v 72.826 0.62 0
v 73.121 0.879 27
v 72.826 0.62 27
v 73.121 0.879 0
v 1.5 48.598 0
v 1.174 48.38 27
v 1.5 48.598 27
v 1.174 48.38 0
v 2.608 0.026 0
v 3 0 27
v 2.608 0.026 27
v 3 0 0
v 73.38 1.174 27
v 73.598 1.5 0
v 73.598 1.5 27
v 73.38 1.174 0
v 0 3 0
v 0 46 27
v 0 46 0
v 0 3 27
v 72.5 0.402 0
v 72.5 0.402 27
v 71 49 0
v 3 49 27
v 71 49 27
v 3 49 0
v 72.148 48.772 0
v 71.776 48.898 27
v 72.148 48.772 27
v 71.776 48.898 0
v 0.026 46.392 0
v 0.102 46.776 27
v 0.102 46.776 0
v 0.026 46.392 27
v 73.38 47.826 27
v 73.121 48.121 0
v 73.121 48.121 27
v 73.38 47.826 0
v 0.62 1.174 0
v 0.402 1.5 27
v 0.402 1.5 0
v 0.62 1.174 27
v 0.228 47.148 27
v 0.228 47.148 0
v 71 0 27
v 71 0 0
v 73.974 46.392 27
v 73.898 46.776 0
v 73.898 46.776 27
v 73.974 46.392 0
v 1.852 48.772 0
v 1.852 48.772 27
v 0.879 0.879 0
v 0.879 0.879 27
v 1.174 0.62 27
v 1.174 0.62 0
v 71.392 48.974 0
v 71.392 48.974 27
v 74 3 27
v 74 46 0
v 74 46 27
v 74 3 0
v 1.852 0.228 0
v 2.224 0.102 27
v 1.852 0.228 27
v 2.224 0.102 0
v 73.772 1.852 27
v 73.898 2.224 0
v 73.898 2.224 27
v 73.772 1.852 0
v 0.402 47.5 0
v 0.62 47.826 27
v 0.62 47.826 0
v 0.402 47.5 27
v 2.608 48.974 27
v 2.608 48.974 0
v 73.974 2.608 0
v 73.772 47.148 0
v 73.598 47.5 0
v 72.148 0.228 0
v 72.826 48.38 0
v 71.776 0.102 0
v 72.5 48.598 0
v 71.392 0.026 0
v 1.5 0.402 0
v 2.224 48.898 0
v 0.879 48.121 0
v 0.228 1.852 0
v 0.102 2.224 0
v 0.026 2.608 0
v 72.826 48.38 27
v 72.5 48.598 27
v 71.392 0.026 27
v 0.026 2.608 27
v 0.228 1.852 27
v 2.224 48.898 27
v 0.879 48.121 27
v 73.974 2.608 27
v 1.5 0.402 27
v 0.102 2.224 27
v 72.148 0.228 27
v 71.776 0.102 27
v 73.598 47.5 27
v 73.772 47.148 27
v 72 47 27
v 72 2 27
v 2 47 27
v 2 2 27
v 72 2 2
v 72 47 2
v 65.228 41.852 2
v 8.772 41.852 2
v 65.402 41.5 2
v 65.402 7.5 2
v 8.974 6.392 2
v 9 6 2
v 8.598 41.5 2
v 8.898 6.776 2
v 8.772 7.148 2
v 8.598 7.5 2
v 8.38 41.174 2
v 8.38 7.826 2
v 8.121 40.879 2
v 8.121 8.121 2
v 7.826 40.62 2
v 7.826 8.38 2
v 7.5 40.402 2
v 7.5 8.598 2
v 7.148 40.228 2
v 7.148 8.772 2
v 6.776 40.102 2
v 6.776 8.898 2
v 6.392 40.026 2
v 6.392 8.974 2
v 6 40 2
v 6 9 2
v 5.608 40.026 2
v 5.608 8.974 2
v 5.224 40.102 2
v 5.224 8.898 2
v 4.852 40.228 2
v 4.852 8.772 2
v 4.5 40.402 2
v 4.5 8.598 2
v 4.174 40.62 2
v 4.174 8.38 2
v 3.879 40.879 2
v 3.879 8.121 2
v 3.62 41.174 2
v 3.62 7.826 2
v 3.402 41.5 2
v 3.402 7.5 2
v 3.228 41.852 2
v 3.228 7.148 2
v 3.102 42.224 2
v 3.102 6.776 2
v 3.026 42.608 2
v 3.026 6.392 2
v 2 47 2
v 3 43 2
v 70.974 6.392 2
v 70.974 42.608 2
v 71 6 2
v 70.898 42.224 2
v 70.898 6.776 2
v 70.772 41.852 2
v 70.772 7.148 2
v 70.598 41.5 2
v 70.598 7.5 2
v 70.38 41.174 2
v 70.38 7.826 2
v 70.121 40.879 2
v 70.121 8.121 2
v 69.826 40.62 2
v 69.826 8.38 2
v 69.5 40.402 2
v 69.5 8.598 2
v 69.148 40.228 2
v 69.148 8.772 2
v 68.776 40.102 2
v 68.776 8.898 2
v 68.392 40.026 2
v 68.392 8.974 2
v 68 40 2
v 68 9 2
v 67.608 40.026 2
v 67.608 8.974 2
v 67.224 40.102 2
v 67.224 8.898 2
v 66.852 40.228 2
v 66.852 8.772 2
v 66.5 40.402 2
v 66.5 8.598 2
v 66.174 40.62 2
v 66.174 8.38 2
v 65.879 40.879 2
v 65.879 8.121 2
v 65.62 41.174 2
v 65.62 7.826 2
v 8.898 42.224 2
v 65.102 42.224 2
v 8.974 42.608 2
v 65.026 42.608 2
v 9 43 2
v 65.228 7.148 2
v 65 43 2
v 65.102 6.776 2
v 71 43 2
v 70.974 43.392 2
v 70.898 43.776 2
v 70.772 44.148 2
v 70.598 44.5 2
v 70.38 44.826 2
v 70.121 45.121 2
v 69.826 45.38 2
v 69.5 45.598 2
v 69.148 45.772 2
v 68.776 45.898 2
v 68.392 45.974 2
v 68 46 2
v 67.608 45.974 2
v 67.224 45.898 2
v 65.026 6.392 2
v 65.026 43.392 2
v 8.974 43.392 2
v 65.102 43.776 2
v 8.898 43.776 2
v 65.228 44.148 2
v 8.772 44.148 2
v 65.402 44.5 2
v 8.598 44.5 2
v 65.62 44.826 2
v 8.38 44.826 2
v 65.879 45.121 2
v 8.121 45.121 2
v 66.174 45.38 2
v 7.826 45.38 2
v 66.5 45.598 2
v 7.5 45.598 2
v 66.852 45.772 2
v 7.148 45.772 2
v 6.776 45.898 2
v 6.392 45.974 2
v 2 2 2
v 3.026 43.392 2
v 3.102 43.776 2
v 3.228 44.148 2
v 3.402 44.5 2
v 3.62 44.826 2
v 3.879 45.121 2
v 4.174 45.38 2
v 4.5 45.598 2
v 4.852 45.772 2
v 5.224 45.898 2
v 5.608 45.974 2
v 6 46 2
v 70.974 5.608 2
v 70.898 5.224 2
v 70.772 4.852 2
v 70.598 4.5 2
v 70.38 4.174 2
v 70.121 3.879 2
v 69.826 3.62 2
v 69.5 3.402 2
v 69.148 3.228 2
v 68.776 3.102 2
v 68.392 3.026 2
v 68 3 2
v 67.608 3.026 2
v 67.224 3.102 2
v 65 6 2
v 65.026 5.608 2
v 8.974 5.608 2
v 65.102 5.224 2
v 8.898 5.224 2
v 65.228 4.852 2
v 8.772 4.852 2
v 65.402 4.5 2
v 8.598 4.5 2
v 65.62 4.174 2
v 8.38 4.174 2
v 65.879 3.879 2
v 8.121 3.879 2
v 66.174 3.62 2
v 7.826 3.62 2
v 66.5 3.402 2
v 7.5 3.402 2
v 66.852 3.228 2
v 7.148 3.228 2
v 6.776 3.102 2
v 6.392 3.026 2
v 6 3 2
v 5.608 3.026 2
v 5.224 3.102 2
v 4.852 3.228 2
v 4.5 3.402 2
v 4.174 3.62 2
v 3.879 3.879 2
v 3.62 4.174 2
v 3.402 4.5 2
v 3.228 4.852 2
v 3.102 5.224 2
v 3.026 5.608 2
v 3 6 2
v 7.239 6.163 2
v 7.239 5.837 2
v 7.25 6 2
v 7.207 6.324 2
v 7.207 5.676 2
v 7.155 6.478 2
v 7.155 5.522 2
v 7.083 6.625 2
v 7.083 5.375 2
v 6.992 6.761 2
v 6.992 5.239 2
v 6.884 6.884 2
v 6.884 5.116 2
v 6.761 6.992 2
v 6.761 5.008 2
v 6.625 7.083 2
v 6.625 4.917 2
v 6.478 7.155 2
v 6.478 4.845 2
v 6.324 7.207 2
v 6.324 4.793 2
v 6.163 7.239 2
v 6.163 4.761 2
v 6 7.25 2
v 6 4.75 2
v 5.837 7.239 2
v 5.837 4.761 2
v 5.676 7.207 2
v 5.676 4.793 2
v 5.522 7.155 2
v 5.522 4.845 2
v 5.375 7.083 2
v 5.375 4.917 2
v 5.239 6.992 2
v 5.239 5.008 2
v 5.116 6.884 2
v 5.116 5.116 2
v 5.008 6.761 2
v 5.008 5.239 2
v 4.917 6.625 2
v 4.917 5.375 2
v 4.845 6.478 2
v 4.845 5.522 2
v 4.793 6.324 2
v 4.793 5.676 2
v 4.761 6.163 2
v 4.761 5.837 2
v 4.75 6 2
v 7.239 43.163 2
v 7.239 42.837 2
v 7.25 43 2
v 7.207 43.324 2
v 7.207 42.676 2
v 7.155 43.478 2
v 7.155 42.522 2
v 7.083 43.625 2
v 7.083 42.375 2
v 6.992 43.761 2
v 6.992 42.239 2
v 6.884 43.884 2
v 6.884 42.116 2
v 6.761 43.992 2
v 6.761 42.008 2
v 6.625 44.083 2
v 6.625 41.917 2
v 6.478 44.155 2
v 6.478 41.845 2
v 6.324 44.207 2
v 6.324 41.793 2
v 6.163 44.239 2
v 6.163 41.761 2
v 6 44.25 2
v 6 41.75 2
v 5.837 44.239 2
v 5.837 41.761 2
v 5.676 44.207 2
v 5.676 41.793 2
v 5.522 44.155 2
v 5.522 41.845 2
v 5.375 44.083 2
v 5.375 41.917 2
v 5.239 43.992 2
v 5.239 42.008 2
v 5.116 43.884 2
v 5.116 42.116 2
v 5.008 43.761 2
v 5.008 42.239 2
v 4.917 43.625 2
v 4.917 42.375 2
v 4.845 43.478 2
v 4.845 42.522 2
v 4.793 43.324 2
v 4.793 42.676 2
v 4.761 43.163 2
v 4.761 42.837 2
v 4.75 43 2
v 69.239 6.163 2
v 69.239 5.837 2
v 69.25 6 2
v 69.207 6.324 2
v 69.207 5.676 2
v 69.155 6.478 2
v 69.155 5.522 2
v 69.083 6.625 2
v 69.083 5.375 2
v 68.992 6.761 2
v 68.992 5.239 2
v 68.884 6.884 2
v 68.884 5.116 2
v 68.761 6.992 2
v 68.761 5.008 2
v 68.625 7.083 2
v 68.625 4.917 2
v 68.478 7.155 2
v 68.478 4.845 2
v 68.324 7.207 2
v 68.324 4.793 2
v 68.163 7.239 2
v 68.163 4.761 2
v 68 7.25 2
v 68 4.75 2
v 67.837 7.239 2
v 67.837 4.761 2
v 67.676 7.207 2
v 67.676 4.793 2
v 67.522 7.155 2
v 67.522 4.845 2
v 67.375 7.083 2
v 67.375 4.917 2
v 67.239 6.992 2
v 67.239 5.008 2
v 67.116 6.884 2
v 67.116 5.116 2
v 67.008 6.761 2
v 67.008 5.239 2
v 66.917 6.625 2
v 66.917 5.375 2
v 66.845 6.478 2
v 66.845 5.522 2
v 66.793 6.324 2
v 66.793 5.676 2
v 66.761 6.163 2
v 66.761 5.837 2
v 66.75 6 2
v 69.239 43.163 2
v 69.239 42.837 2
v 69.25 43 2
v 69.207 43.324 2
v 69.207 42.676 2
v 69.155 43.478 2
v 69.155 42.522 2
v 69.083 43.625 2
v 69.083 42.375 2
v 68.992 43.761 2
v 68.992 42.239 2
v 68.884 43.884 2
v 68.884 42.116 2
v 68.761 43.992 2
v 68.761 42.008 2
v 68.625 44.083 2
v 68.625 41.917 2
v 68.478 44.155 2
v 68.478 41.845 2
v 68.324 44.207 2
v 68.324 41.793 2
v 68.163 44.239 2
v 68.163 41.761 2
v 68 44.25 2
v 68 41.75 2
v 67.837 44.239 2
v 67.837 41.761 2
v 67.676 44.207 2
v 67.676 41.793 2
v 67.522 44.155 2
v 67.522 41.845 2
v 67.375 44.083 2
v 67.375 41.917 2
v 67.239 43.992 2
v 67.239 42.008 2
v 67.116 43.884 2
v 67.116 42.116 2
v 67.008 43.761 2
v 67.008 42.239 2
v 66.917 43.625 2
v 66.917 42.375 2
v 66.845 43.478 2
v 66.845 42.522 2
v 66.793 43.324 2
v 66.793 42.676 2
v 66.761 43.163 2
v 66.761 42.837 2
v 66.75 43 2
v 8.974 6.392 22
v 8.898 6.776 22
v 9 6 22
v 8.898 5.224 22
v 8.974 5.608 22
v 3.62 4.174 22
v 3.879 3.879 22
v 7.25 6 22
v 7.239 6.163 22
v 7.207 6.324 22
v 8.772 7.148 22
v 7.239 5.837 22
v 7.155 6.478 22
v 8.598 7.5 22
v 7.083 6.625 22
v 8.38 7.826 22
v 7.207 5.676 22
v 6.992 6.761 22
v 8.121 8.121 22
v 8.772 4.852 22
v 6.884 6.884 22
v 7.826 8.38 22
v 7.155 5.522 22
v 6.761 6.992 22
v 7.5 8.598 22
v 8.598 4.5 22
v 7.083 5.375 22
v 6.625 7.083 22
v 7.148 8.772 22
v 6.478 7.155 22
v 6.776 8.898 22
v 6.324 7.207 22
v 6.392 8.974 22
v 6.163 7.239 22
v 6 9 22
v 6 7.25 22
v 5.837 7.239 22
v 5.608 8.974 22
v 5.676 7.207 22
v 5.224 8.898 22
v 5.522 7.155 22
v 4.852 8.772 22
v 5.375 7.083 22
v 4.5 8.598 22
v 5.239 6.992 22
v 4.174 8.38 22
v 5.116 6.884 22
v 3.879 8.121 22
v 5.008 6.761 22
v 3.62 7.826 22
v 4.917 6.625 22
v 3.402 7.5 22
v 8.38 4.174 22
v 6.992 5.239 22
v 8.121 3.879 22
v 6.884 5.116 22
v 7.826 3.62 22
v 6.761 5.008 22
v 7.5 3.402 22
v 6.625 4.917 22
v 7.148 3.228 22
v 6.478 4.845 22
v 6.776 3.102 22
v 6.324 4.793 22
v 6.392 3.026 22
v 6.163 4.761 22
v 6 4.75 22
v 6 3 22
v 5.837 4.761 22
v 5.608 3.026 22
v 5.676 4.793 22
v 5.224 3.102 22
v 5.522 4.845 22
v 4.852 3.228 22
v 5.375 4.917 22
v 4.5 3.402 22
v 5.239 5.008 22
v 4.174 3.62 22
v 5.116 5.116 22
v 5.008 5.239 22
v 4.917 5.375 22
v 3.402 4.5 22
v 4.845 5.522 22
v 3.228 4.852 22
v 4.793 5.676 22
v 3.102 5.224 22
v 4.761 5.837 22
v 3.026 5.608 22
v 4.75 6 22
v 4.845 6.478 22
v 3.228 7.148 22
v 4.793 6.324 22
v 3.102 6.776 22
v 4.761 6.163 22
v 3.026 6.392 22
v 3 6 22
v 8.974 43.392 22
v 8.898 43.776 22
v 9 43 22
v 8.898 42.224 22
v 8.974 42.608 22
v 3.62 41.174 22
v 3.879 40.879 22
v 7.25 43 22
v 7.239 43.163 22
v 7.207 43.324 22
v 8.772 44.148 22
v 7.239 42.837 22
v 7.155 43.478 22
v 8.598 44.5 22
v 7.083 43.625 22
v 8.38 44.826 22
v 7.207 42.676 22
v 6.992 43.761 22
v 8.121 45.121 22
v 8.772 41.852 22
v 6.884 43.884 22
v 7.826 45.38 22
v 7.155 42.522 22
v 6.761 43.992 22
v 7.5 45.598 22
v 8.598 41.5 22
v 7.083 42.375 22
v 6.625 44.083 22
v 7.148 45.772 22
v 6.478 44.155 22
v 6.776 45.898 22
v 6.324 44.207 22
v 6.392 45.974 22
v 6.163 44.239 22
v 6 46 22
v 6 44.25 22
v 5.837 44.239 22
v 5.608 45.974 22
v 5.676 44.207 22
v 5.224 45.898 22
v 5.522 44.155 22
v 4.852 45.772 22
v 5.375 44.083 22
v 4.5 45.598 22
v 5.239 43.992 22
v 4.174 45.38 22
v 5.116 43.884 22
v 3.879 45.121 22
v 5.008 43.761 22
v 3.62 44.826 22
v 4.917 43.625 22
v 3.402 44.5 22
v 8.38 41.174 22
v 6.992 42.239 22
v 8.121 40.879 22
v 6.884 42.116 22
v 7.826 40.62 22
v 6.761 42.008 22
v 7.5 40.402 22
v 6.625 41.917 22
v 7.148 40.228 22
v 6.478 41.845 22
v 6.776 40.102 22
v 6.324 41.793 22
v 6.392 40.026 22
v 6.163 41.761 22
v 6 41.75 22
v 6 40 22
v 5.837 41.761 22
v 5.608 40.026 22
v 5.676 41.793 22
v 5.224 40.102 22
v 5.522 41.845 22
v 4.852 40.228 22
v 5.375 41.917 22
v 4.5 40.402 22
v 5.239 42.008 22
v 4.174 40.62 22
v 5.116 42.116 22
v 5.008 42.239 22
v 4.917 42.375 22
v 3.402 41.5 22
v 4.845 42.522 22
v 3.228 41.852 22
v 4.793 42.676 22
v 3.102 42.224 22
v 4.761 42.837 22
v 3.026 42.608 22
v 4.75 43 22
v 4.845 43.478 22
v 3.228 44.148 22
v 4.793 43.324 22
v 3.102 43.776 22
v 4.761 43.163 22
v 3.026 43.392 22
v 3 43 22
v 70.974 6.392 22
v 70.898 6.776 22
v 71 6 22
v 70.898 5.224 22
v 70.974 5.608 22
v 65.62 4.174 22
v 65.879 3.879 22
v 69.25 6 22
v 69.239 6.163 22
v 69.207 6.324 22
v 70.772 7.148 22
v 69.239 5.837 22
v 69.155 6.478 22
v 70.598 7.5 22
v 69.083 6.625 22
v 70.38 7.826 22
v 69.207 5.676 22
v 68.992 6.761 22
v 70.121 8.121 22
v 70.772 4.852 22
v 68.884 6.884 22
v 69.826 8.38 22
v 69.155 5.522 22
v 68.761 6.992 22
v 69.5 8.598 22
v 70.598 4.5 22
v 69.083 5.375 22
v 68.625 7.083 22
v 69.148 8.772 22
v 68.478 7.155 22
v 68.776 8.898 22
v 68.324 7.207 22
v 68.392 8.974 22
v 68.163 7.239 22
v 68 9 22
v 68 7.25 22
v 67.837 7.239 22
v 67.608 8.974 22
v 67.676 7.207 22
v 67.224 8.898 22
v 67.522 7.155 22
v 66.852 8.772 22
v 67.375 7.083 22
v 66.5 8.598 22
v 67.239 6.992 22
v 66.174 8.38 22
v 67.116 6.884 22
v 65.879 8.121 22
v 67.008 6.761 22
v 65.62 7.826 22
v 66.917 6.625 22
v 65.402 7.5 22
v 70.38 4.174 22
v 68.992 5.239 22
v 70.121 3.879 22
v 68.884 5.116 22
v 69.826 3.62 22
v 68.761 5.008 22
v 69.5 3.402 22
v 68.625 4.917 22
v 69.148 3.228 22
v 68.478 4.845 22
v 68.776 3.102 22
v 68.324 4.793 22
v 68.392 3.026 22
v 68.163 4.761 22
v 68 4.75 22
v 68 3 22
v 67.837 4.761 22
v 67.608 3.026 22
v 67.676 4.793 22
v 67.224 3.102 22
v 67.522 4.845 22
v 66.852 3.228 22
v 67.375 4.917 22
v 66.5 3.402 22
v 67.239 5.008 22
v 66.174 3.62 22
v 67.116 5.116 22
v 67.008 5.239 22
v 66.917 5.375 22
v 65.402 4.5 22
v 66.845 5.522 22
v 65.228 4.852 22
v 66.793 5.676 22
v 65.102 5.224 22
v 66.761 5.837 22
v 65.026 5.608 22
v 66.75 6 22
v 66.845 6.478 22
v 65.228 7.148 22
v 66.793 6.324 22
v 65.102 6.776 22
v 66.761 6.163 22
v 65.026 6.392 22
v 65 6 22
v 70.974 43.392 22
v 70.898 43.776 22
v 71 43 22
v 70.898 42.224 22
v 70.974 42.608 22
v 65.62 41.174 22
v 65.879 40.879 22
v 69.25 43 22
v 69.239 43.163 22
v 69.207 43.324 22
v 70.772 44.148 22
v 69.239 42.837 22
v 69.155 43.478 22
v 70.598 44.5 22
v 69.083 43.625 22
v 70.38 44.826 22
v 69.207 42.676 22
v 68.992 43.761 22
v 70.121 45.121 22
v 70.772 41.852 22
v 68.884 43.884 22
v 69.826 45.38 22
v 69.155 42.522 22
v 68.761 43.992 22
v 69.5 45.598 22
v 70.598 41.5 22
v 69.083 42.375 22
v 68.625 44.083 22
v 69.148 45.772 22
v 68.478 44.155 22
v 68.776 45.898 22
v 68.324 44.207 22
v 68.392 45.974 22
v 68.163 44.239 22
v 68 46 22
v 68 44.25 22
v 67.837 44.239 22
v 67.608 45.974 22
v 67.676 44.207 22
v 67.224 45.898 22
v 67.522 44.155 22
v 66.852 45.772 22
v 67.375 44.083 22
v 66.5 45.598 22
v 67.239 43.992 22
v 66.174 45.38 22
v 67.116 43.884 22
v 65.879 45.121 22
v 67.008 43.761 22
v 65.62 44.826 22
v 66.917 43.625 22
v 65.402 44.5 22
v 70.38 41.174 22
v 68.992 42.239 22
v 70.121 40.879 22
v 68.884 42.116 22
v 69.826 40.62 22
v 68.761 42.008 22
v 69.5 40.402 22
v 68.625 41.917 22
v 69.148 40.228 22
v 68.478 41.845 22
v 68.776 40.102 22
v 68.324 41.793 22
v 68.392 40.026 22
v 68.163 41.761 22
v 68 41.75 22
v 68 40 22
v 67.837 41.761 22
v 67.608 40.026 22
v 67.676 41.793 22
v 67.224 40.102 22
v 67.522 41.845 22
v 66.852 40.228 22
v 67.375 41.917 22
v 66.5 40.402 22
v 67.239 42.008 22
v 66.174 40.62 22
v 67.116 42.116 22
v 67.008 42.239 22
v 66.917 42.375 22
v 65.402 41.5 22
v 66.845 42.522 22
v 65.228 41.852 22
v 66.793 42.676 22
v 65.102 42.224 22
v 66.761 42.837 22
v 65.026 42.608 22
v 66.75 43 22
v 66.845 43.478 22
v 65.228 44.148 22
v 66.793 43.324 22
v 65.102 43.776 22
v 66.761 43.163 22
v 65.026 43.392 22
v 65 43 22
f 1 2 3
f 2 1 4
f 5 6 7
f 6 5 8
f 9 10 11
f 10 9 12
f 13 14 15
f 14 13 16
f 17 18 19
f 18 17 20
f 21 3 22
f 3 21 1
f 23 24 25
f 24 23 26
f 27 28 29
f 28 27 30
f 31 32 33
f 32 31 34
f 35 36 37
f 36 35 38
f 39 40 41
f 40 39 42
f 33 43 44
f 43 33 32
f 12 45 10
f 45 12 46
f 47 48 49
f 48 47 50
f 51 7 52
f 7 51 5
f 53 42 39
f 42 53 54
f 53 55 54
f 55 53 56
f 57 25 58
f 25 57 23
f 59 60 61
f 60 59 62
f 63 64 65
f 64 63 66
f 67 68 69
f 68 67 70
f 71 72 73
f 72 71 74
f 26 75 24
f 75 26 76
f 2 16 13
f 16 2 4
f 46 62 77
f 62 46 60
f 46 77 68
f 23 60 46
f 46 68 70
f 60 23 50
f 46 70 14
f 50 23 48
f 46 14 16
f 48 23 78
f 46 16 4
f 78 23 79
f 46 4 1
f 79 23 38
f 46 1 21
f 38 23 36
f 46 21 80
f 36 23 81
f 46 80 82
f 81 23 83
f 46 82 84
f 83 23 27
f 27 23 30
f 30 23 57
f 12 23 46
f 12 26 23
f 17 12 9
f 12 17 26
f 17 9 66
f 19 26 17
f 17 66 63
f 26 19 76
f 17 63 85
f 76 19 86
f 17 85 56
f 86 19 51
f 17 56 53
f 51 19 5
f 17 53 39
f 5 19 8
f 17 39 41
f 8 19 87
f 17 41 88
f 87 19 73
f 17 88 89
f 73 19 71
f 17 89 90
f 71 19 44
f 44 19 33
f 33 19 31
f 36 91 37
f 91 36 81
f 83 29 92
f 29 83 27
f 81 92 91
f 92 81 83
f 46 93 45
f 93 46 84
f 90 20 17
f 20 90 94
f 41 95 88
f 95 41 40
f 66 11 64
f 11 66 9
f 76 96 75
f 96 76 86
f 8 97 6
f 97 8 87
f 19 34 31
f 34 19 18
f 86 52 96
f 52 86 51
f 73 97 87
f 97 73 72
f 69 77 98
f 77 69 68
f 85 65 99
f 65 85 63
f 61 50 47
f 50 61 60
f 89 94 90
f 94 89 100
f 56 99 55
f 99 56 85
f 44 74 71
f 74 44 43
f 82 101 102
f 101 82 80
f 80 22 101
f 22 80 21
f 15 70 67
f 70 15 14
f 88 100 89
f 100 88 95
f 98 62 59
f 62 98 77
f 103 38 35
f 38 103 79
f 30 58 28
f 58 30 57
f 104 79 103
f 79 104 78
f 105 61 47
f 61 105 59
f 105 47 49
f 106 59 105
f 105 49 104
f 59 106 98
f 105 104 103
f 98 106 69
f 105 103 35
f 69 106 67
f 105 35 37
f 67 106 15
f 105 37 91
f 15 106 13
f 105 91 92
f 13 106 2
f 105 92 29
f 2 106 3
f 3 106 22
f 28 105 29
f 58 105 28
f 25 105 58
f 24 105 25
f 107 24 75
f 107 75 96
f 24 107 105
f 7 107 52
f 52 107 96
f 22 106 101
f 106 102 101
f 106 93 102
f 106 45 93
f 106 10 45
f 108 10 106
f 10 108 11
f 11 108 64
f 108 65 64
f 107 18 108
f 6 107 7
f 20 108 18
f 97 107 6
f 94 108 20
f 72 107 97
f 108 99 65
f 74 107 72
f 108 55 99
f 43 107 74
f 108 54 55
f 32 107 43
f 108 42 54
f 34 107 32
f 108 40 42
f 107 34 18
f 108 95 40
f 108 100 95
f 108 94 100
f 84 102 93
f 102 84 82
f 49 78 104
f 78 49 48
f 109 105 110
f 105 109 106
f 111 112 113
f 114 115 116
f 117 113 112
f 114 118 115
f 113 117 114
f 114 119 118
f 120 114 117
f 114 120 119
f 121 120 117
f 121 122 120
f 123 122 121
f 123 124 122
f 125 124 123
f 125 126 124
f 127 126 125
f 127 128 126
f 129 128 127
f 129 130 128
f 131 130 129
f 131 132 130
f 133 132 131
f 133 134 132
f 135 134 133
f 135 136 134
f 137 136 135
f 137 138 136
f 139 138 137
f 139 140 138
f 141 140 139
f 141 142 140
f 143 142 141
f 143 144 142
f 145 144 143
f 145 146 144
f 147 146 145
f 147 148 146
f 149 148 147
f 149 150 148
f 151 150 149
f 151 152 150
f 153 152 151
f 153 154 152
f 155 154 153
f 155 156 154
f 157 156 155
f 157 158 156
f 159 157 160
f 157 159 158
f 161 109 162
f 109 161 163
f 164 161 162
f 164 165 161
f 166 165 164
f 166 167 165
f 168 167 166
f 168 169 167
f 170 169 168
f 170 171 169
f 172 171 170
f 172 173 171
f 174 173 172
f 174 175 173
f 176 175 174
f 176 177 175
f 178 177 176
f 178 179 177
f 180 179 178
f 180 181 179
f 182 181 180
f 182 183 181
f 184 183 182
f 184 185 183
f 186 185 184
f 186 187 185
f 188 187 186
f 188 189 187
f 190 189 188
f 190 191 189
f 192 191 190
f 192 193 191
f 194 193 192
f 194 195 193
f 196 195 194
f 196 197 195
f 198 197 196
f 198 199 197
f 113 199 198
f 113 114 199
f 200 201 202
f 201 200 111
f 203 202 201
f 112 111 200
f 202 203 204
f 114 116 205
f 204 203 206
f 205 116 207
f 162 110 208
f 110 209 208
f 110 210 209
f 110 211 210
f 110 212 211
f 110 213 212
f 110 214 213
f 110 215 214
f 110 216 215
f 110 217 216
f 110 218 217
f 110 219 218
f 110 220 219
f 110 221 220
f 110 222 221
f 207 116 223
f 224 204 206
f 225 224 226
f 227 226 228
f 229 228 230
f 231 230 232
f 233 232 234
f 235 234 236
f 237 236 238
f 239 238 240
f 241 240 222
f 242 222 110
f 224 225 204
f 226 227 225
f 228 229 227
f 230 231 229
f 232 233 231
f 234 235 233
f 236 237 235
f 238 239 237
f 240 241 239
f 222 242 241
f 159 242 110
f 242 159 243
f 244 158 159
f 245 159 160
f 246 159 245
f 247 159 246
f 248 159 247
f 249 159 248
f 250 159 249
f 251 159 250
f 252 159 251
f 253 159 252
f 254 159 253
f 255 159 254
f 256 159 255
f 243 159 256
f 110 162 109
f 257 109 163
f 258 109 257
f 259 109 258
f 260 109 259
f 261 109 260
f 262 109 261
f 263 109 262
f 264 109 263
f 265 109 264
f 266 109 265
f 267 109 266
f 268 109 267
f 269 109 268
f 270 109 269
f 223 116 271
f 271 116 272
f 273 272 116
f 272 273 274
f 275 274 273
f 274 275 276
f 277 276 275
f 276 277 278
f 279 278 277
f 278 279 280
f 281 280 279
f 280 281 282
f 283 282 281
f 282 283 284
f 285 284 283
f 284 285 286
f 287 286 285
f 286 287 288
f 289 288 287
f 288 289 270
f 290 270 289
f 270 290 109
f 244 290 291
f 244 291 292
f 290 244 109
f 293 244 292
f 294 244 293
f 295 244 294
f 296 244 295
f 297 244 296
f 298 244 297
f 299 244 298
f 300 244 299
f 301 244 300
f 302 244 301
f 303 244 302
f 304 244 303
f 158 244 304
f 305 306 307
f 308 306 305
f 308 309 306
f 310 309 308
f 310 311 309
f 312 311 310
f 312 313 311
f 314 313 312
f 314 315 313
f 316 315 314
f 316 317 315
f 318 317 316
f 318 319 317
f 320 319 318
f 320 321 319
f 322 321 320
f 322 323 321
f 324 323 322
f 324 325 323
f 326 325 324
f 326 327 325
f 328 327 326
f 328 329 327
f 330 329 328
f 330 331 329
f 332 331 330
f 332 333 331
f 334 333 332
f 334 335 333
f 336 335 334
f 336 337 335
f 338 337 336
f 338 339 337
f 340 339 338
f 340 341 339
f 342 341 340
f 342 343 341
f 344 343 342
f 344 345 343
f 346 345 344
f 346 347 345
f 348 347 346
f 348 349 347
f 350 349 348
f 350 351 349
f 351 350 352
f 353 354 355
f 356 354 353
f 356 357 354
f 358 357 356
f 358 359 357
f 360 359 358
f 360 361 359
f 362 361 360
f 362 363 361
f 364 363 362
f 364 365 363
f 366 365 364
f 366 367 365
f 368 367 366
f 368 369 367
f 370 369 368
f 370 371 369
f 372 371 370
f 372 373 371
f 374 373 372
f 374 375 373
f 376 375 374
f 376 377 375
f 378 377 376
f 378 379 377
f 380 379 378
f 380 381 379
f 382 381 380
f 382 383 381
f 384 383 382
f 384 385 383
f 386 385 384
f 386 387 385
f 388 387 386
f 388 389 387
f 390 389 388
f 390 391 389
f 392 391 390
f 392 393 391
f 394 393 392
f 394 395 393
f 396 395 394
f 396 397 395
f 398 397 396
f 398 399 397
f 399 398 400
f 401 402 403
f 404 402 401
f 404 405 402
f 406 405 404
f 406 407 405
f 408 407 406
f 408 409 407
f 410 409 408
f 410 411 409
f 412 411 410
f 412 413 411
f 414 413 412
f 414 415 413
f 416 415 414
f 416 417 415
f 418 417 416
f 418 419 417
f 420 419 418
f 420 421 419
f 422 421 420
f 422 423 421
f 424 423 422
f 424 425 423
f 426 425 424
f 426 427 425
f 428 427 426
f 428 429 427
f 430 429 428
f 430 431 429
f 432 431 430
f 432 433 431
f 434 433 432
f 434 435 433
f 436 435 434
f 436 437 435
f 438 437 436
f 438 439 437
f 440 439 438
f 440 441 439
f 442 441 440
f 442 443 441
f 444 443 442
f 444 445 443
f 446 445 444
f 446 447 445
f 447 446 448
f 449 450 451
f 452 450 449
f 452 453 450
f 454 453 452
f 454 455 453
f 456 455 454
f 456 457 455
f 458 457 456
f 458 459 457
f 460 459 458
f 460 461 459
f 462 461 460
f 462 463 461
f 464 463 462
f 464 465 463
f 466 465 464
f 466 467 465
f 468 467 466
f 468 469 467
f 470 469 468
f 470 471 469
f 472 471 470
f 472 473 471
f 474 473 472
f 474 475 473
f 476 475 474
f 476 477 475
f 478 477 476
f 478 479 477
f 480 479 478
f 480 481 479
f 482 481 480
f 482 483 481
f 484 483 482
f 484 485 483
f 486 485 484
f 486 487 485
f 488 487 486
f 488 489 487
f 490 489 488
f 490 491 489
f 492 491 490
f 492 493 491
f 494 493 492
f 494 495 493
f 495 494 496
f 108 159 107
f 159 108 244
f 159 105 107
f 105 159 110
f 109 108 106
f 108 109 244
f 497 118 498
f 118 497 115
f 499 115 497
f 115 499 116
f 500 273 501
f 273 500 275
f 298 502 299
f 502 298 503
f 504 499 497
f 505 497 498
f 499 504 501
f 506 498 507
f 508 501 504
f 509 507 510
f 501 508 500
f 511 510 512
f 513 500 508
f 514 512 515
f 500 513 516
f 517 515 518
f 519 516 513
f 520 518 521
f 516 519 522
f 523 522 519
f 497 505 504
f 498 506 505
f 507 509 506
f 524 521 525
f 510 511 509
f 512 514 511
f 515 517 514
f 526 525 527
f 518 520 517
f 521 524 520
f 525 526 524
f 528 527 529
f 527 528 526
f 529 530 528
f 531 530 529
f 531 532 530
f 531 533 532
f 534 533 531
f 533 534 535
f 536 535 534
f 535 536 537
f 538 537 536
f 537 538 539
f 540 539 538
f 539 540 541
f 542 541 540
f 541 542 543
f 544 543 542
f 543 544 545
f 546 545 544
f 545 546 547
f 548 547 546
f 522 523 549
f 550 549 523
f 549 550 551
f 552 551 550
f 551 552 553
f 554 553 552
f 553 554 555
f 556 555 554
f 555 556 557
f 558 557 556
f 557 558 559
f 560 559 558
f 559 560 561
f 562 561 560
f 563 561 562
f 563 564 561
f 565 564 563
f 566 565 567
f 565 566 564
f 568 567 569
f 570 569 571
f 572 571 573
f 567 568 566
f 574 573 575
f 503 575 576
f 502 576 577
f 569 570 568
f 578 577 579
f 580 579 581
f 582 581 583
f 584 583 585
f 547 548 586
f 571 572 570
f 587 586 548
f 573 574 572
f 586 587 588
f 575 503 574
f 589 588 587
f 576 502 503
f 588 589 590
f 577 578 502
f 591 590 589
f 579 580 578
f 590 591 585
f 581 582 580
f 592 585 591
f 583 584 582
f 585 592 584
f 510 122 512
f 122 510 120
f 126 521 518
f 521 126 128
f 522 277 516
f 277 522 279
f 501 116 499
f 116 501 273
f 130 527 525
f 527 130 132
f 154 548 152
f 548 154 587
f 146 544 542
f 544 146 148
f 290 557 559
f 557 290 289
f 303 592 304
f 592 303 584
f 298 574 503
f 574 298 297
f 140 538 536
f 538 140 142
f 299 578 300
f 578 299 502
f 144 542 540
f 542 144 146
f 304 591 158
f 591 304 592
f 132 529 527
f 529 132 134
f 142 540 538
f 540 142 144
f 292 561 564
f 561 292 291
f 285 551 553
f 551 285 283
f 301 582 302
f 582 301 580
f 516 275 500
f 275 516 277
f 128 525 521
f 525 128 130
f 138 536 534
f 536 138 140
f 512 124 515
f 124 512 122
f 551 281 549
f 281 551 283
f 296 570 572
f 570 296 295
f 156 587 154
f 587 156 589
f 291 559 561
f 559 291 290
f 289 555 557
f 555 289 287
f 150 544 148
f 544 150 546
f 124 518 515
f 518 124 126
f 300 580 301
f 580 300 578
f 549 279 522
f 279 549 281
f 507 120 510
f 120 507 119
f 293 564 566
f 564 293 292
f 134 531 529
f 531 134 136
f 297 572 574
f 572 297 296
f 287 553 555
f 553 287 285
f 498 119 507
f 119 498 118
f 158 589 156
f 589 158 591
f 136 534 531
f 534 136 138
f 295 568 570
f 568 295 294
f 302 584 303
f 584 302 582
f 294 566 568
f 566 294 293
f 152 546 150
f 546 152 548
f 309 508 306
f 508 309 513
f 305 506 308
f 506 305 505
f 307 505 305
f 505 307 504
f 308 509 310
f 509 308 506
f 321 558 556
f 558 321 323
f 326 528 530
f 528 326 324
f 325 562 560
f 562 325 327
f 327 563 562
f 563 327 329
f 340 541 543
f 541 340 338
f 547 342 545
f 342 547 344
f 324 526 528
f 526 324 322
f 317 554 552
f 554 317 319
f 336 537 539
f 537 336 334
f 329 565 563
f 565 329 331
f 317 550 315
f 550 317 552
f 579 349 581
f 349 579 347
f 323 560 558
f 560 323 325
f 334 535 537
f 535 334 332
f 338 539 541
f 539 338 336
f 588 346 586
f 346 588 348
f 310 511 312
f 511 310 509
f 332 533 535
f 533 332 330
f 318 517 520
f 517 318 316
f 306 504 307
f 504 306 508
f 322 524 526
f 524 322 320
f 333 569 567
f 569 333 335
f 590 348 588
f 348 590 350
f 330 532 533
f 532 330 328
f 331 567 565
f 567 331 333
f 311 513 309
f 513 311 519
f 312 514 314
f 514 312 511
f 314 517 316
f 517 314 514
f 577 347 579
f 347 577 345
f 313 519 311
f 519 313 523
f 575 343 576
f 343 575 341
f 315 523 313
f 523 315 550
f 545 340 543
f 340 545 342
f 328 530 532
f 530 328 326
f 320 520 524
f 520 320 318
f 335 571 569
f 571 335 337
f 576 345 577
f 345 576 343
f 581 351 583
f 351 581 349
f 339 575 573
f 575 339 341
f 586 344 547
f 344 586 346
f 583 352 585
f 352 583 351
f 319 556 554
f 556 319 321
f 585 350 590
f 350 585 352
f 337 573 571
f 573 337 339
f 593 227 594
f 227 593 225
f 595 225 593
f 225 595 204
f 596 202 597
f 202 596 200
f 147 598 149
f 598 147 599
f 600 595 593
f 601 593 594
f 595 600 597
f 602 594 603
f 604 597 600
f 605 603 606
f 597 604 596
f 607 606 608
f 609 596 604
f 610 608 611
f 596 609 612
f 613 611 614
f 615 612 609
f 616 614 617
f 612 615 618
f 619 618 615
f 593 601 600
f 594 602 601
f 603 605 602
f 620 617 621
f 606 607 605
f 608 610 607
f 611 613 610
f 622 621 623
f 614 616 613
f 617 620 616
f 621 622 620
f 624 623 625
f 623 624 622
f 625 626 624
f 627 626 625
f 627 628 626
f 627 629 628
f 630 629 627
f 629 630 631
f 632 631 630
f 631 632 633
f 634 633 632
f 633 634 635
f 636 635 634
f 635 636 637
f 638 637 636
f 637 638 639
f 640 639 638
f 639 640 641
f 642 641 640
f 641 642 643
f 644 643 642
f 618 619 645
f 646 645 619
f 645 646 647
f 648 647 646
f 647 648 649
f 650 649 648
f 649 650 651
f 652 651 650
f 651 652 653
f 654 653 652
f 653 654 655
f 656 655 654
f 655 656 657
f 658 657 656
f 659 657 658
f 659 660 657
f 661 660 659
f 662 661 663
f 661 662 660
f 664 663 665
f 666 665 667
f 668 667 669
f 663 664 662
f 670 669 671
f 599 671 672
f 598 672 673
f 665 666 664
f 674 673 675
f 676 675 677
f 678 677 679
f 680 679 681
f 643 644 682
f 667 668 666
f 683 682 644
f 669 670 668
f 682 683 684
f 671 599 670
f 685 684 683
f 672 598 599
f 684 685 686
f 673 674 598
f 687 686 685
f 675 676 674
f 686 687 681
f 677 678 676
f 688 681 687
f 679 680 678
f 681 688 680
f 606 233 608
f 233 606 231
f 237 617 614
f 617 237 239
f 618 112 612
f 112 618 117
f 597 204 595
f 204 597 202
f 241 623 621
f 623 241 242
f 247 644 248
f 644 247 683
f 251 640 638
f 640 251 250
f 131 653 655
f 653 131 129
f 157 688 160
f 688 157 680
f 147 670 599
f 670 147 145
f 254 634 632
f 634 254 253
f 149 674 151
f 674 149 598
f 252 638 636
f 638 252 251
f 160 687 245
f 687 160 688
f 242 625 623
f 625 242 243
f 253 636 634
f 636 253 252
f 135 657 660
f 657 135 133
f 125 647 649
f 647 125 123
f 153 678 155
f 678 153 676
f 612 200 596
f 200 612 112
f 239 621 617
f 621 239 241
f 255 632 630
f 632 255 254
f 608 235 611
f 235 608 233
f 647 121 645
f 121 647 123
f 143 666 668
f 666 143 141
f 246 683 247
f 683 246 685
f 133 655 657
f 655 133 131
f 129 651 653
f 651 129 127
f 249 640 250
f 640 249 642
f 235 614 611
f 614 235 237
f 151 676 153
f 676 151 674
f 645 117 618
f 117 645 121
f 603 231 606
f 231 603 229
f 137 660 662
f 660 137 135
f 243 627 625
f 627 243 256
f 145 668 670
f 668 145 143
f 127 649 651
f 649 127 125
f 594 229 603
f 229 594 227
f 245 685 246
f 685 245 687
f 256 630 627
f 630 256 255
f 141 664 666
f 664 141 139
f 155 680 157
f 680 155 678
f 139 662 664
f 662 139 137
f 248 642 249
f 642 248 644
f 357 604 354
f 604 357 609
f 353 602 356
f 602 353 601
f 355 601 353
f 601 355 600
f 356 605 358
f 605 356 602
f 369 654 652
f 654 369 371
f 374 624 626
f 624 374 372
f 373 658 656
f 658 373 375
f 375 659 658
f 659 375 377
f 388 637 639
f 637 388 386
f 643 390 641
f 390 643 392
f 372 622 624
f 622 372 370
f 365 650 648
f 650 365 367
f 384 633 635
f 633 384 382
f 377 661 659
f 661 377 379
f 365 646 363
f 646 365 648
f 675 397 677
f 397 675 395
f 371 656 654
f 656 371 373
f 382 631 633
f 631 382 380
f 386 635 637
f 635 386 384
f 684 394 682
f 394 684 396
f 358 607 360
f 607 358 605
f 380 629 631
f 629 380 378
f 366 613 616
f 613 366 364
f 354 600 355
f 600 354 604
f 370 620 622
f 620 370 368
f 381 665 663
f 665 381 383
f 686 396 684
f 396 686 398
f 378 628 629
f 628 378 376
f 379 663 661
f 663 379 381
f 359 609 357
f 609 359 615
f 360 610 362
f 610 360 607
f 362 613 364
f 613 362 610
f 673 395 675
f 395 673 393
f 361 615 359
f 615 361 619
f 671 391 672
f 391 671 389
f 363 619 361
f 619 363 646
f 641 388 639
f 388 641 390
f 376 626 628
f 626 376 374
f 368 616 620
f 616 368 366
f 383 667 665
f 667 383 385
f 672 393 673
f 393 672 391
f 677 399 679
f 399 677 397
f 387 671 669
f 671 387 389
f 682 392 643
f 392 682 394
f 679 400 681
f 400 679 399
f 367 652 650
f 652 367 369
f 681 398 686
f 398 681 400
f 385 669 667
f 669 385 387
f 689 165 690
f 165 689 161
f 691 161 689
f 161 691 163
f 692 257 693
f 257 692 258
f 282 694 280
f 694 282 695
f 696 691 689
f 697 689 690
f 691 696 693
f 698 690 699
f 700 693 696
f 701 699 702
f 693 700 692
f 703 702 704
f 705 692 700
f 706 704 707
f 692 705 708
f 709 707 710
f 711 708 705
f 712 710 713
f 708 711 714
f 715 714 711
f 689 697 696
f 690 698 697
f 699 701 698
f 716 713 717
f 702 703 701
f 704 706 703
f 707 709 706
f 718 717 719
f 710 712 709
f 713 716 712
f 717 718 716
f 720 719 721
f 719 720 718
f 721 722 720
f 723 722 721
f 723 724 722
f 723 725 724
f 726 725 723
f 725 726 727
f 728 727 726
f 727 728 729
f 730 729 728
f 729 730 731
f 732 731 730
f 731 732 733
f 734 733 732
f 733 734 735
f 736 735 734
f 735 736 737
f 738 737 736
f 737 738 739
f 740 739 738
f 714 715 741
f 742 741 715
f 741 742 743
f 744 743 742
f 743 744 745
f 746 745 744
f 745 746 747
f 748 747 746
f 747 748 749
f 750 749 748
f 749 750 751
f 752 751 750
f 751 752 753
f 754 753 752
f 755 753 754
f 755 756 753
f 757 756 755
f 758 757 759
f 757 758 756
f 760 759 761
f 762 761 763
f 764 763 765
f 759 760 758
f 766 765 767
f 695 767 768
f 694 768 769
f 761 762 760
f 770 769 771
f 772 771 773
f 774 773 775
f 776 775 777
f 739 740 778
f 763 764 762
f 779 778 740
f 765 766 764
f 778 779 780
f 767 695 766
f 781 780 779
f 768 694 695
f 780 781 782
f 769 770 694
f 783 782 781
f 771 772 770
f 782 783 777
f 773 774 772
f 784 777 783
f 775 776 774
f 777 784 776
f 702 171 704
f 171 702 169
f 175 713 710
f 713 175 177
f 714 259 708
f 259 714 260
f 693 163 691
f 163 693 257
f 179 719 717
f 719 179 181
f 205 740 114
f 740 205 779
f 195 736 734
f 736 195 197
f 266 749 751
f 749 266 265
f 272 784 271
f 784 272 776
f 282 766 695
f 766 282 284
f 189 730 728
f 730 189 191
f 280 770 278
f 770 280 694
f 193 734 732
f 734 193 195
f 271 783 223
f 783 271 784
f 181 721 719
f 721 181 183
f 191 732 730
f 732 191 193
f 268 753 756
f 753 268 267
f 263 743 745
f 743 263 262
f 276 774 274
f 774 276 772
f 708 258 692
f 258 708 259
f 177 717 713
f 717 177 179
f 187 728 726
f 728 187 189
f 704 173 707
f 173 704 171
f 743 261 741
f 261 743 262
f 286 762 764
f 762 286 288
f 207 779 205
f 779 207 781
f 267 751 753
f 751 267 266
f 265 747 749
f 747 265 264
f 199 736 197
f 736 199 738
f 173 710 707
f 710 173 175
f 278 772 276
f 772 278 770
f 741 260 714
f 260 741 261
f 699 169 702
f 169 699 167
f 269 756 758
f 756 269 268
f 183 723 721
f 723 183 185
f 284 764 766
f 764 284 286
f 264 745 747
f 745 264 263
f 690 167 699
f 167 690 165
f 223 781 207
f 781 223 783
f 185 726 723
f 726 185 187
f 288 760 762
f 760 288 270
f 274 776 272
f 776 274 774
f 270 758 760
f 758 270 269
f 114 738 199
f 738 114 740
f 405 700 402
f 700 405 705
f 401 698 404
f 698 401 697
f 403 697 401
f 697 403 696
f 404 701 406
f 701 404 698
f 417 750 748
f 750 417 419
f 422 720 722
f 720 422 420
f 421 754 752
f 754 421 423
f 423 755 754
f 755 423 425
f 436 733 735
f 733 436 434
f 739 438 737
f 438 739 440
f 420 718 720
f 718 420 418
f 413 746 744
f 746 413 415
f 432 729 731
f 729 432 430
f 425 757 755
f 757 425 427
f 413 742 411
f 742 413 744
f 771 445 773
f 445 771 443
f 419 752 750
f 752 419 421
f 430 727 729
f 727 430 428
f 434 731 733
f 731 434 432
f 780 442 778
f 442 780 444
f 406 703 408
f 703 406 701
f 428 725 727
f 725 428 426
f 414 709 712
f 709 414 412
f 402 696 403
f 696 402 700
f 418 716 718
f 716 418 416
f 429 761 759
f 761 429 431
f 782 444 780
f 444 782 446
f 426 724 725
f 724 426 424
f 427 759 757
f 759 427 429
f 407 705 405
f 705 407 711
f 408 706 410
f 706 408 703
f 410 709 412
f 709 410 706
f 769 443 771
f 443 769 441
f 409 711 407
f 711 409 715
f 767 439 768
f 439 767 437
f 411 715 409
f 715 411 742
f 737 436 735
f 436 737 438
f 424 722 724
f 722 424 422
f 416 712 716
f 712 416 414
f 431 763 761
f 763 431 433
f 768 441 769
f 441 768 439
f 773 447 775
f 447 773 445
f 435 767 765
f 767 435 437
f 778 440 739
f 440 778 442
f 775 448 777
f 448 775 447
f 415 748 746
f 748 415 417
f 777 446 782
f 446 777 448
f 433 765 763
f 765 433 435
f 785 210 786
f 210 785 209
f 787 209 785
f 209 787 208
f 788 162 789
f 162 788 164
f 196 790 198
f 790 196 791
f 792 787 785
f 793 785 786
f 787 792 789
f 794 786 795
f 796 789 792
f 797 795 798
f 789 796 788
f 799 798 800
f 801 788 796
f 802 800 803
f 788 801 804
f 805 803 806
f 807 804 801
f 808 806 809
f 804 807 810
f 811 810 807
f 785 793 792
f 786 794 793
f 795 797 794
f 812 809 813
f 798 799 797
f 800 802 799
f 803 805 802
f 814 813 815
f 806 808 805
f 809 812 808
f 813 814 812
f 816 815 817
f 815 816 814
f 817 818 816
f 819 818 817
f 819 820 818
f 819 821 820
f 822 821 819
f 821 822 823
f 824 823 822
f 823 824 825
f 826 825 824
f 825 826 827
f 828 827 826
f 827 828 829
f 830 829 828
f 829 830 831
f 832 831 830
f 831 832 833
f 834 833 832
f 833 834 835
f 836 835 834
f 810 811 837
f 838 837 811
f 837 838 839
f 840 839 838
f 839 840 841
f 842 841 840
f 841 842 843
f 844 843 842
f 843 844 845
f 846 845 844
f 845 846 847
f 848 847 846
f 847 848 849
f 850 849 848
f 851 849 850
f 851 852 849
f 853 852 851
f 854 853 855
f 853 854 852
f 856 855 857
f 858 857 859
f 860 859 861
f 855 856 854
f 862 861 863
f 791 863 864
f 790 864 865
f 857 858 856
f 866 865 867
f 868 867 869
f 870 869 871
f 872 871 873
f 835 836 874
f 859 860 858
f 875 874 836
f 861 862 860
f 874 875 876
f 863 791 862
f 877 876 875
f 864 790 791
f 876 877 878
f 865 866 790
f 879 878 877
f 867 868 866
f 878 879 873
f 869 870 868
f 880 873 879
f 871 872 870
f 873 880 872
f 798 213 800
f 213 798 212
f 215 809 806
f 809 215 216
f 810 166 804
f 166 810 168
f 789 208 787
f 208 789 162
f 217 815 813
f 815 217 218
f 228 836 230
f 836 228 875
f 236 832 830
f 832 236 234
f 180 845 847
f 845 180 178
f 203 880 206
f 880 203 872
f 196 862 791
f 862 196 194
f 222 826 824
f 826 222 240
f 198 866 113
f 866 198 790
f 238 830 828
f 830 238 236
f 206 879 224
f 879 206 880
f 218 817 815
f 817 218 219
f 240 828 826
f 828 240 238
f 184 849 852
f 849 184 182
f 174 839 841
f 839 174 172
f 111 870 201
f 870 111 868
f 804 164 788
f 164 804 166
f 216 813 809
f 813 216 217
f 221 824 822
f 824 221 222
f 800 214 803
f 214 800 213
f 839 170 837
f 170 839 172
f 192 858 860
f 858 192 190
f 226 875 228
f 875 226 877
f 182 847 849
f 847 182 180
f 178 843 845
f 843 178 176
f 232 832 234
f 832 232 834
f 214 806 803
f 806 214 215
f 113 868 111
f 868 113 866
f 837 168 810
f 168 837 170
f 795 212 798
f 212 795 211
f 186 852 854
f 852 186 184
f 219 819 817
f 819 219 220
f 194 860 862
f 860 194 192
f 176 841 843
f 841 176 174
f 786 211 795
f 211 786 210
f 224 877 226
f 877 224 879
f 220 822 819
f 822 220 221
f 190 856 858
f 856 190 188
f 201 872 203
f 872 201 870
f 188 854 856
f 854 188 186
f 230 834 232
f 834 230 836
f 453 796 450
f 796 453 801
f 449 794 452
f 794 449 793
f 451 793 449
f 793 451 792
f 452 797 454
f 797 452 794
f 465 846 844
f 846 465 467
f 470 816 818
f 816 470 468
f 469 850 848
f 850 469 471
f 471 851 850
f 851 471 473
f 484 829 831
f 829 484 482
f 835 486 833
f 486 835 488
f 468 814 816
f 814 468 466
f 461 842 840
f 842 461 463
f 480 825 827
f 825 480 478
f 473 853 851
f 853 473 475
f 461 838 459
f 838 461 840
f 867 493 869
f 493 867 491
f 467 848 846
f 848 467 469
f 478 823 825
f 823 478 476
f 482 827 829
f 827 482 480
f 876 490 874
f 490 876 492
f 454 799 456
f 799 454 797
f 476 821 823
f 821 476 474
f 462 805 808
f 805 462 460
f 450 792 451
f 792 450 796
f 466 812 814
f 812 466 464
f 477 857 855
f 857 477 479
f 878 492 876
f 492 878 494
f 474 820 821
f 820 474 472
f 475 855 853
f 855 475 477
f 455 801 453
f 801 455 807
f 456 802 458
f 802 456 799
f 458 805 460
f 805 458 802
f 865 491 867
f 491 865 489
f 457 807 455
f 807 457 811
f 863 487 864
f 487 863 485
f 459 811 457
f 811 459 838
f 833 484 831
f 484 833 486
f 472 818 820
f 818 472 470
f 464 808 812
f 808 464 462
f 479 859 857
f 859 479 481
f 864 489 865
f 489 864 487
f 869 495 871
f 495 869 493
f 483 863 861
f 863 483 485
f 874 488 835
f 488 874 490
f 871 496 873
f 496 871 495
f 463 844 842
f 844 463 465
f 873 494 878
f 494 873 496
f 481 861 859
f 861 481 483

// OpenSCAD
// Parametric electronics enclosure with screw posts and a snap lid
/* [Inside dimensions] */
inner_x = 70;   // [20:200]
inner_y = 45;   // [20:200]
inner_z = 25;   // [10:100]
/* [Walls] */
wall = 2;       // [1:0.2:5]
floor_t = 2;    // [1:0.2:5]
corner_r = 3;   // [0.5:0.5:10]
/* [Screw posts] */
post_d = 6;     // [4:0.5:12]
screw_d = 2.5;  // [1.5:0.1:5]
post_inset = 4; // [3:15]
/* [Hidden] */
$fn = 48;
eps = 0.01;

outer = [inner_x + 2 * wall, inner_y + 2 * wall, inner_z + floor_t];

module rounded_box(size, r) {
  hull()
    for (x = [r, size[0] - r], y = [r, size[1] - r])
      translate([x, y, 0]) cylinder(r = r, h = size[2]);
}

module post_positions() {
  for (x = [wall + post_inset, outer[0] - wall - post_inset])
    for (y = [wall + post_inset, outer[1] - wall - post_inset])
      translate([x, y, 0]) children();
}

module enclosure() {
  difference() {
    rounded_box(outer, corner_r);
    translate([wall, wall, floor_t]) cube([inner_x, inner_y, inner_z + eps]);
  }
  post_positions()
    difference() {
      cylinder(d = post_d, h = inner_z * 0.8 + floor_t);
      translate([0, 0, floor_t]) cylinder(d = screw_d, h = inner_z);
    }
}

enclosure();
